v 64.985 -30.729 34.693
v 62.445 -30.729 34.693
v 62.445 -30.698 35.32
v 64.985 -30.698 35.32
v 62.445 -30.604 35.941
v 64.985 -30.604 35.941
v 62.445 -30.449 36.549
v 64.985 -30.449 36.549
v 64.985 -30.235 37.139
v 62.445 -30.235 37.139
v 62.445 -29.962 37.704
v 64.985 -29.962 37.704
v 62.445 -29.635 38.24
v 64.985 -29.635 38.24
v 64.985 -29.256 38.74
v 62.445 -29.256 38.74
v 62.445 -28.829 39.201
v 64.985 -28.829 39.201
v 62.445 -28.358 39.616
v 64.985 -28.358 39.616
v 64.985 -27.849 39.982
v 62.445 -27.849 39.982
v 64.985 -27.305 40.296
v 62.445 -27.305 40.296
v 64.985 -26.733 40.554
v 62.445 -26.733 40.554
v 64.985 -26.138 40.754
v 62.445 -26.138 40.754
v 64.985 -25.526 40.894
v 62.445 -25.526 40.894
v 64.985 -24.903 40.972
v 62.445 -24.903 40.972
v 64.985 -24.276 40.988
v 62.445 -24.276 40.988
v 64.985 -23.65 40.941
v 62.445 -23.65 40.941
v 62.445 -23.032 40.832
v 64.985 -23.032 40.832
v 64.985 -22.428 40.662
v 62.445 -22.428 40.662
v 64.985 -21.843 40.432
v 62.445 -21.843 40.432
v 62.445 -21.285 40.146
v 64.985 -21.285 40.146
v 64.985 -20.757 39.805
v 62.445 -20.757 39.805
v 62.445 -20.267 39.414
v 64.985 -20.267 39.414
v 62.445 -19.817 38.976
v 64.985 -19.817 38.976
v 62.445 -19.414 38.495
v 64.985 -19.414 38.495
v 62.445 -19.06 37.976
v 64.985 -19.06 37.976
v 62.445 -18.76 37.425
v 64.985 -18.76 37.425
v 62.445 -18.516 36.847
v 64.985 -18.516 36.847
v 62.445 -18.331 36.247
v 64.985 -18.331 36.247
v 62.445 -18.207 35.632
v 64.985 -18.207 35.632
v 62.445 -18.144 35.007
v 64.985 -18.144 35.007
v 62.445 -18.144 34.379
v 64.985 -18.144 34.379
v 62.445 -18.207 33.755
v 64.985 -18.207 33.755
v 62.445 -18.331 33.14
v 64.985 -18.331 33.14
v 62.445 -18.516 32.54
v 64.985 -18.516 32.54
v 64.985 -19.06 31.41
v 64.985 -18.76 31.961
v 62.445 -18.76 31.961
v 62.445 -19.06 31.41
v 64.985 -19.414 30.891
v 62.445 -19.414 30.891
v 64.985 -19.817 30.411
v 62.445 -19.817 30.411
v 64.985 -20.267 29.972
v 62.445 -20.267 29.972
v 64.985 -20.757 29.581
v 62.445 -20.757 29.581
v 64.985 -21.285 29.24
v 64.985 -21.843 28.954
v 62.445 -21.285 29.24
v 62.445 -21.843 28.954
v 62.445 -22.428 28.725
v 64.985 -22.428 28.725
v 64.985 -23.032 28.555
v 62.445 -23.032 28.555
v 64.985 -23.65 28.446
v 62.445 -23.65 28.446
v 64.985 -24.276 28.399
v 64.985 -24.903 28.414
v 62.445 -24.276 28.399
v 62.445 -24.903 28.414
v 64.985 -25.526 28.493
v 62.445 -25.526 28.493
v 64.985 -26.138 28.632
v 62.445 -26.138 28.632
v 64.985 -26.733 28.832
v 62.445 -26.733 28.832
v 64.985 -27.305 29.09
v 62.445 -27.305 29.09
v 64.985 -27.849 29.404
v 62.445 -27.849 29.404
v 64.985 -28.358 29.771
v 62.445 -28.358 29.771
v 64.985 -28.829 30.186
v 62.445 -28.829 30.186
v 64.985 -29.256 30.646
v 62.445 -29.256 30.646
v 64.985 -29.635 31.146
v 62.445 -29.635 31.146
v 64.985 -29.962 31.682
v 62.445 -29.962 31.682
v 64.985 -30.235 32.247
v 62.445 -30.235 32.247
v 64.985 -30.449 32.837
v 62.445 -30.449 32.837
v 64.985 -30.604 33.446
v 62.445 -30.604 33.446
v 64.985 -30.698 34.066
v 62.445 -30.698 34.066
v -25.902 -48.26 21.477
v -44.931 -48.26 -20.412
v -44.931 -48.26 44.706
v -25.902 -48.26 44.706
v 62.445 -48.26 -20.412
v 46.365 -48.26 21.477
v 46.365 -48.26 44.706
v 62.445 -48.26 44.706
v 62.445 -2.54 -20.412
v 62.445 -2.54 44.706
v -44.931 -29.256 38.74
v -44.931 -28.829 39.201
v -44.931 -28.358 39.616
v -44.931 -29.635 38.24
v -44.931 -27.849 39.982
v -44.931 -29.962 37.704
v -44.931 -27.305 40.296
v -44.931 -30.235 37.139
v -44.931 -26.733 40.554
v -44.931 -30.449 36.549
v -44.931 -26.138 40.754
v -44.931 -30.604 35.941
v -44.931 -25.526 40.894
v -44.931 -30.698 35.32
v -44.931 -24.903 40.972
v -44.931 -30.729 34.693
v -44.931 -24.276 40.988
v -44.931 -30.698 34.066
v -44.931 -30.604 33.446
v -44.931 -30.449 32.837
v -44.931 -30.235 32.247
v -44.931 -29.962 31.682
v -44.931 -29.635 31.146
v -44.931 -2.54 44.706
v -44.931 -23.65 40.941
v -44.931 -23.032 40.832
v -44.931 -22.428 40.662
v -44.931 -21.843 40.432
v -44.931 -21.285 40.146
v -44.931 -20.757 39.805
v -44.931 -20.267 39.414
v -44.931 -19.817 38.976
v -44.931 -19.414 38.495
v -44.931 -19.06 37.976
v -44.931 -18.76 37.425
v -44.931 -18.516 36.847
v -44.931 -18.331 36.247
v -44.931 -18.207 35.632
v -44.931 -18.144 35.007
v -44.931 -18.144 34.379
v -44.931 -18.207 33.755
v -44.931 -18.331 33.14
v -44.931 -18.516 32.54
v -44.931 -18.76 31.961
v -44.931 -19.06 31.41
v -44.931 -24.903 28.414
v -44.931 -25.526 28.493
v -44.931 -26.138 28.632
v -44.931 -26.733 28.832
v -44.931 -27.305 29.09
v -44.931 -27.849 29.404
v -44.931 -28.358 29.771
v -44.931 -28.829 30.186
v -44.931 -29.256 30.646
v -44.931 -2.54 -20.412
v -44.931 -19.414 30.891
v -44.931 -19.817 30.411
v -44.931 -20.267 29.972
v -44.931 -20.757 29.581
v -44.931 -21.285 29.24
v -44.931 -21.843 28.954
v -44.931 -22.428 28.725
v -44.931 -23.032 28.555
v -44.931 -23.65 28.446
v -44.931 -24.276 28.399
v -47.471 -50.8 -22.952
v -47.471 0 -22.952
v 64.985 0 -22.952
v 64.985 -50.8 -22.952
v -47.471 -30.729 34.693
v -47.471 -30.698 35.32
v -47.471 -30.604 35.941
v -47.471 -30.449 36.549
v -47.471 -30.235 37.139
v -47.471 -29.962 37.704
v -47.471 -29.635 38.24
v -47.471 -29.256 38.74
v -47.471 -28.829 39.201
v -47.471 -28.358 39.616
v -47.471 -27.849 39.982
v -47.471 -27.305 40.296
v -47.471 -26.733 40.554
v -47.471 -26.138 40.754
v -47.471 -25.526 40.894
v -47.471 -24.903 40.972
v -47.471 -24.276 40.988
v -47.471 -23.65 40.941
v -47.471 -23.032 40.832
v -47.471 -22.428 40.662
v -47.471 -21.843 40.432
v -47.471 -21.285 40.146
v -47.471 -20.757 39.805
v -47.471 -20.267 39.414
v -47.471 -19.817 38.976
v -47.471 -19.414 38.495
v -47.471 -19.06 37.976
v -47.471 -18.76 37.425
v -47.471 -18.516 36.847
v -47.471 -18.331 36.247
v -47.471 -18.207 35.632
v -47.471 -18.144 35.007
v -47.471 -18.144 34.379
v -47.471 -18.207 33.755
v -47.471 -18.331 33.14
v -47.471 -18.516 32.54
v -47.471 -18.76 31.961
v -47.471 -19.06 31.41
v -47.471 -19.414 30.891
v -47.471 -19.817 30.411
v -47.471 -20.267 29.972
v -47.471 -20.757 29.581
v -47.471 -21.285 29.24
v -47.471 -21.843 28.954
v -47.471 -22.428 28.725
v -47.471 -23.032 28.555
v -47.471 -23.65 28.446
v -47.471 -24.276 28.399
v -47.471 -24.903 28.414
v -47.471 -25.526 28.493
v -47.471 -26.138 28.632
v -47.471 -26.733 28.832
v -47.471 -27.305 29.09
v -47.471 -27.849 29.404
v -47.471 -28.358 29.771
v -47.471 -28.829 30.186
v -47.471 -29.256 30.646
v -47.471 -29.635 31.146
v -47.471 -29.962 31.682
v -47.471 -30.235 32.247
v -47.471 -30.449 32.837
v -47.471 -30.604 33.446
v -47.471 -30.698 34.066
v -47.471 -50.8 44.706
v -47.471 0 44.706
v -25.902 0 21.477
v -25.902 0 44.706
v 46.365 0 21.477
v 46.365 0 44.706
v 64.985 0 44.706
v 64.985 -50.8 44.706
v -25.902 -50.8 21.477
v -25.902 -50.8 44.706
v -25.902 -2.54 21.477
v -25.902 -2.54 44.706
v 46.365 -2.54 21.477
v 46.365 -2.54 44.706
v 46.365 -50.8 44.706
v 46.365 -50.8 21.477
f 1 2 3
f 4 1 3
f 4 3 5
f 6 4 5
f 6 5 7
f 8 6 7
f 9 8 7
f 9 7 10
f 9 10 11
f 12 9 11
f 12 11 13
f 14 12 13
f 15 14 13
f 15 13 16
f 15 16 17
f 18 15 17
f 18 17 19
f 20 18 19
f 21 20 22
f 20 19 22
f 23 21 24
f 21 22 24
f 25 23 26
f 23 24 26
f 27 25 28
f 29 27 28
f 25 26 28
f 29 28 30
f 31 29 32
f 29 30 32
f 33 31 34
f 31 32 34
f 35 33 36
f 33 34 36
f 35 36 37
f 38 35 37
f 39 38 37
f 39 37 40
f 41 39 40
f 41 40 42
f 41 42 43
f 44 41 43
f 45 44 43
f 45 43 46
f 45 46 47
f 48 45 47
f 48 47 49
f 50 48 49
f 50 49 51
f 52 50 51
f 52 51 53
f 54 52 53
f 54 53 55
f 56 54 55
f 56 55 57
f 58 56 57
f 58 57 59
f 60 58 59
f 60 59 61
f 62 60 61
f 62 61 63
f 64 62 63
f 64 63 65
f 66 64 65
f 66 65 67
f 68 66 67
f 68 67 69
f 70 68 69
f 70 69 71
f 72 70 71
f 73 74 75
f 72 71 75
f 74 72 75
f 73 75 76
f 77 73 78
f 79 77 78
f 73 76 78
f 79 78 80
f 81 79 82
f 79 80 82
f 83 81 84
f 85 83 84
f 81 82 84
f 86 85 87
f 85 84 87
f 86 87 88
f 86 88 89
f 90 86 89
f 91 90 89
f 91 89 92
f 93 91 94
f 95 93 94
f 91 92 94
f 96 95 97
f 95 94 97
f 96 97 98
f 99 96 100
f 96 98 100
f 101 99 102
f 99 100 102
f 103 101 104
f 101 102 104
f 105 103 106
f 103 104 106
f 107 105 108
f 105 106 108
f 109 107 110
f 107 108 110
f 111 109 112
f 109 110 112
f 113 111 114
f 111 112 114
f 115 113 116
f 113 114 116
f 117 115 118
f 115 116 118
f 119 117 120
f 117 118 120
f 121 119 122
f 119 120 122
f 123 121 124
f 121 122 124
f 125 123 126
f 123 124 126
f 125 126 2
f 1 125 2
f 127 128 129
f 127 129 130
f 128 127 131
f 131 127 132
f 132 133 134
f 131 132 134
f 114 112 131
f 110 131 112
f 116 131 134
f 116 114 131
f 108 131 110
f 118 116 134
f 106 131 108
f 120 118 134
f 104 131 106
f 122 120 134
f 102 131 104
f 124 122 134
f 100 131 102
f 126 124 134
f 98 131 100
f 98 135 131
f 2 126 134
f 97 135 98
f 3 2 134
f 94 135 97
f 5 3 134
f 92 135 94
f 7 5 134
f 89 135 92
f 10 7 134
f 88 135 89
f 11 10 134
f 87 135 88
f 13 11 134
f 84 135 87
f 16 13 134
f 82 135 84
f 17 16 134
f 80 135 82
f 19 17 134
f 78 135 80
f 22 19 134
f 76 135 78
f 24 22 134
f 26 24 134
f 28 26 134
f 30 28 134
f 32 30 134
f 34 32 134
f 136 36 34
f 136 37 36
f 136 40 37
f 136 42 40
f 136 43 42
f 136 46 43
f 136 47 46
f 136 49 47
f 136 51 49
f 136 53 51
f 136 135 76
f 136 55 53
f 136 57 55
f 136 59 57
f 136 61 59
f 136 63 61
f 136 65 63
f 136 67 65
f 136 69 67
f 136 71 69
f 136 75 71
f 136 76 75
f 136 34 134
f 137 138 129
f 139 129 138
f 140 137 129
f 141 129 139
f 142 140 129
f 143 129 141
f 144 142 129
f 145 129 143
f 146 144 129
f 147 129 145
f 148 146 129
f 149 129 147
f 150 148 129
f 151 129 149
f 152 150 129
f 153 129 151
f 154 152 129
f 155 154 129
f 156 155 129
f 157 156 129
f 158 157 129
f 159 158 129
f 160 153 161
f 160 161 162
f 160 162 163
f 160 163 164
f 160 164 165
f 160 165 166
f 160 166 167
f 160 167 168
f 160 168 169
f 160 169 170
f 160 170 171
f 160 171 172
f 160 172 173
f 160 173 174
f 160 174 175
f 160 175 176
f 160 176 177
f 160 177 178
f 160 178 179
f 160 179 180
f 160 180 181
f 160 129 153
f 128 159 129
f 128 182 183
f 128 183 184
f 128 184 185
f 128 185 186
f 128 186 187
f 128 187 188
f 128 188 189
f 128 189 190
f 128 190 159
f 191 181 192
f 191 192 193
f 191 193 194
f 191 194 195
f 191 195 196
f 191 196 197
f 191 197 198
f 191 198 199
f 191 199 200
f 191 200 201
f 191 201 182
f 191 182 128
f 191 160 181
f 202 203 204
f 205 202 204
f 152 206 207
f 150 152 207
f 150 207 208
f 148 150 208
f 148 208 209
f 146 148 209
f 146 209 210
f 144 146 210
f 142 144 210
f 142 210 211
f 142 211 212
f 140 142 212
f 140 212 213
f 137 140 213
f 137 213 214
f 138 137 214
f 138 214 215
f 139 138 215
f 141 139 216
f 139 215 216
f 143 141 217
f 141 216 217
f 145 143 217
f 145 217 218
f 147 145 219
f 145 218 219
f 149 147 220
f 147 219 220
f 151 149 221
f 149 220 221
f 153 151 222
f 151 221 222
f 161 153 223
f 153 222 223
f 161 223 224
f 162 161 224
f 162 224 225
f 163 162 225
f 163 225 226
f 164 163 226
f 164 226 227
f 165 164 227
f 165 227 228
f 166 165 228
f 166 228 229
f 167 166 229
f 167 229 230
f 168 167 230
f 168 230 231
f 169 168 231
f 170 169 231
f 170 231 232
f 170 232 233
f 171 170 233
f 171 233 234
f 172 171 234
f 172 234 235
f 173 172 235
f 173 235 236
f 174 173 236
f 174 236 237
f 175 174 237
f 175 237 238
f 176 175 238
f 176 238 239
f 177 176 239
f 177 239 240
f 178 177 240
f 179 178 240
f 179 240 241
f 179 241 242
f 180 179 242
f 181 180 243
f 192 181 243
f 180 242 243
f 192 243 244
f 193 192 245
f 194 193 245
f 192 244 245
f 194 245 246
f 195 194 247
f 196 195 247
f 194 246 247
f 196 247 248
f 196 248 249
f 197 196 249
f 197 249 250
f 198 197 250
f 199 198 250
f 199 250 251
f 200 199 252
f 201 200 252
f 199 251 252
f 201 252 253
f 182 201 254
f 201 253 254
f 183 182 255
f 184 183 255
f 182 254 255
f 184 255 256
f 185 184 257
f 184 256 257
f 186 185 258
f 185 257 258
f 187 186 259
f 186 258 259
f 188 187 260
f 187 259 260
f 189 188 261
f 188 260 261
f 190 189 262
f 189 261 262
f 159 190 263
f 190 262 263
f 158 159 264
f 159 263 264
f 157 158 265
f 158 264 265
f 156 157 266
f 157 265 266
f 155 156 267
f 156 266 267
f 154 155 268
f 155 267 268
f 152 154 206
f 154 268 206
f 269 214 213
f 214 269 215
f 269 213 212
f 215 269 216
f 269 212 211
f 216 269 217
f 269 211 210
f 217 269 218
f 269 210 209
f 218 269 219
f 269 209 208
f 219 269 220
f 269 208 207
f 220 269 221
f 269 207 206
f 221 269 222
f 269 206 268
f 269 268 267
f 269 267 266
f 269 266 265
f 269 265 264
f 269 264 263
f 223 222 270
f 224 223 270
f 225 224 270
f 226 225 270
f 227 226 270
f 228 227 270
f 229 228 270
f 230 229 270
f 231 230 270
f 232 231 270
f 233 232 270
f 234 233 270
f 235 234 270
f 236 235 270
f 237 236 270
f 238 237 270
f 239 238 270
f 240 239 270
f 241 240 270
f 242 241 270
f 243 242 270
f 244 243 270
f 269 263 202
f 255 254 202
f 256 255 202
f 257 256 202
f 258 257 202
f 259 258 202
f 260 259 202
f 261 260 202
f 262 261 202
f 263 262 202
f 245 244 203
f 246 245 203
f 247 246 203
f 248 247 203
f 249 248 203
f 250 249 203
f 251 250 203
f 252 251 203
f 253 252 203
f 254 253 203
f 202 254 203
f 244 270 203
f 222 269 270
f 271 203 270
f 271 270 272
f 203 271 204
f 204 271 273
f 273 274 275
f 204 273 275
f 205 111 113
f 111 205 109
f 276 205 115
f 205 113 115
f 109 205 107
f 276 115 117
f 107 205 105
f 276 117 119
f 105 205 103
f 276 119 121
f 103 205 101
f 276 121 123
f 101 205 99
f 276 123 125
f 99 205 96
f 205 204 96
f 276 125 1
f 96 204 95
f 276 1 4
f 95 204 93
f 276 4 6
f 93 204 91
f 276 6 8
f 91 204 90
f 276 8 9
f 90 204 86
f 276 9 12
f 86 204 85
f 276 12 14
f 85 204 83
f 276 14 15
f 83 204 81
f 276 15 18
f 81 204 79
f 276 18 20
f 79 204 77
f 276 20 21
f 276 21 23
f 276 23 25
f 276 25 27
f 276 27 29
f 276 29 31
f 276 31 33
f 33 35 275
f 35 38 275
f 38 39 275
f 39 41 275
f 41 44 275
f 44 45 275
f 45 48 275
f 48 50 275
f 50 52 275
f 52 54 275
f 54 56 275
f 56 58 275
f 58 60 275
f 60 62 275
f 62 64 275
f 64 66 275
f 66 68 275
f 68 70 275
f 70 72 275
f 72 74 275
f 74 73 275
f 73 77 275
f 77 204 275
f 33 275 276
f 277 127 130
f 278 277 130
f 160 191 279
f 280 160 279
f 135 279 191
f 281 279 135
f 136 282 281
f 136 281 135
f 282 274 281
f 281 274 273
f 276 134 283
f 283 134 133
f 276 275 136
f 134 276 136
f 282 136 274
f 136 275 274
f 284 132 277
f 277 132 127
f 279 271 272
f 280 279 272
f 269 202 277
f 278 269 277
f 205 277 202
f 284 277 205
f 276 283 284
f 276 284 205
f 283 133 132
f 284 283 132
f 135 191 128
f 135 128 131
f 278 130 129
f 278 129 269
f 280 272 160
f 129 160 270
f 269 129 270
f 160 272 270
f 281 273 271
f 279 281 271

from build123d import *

# Parameters (mm, degrees)
F1_DEPTH = 50.8
F2_T     = -2.54
F3_R     = 6.296308
F4_DEPTH = 322.58


with BuildPart() as f1:
    # F0 (on Front) → F1 (new body)
    with BuildSketch(Plane.XZ):
        Polygon((-25.901856, 44.70605), (-47.471371, 44.70605), (-47.471371, -22.952178), (64.985082, -22.952178), (64.985082, 44.70605), (46.365242, 44.70605), (46.365242, 21.47734), (-25.901856, 21.47734), align=None)
    extrude(amount=F1_DEPTH)

    # F2
    f2_openings = [f1.faces().sort_by_distance(p)[0] for p in [
        (10.231693, -25.4, 21.47734),
        (-36.686613, -25.4, 44.70605),
        (55.675162, -25.4, 44.70605),
        (46.365242, -25.4, 33.091695),
        (-25.901856, -25.4, 33.091695),
    ]]
    offset(amount=F2_T, openings=f2_openings)

    # F3 (on face) → F4 (cut)
    with BuildSketch(Plane(origin=(-47.471371, 0, 0), x_dir=(0, -1, 0), z_dir=(-1, 0, 0))):
        with Locations((24.432799, 34.693193)):
            Circle(F3_R)
    extrude(amount=-F4_DEPTH, mode=Mode.SUBTRACT)


solid = f1.part
